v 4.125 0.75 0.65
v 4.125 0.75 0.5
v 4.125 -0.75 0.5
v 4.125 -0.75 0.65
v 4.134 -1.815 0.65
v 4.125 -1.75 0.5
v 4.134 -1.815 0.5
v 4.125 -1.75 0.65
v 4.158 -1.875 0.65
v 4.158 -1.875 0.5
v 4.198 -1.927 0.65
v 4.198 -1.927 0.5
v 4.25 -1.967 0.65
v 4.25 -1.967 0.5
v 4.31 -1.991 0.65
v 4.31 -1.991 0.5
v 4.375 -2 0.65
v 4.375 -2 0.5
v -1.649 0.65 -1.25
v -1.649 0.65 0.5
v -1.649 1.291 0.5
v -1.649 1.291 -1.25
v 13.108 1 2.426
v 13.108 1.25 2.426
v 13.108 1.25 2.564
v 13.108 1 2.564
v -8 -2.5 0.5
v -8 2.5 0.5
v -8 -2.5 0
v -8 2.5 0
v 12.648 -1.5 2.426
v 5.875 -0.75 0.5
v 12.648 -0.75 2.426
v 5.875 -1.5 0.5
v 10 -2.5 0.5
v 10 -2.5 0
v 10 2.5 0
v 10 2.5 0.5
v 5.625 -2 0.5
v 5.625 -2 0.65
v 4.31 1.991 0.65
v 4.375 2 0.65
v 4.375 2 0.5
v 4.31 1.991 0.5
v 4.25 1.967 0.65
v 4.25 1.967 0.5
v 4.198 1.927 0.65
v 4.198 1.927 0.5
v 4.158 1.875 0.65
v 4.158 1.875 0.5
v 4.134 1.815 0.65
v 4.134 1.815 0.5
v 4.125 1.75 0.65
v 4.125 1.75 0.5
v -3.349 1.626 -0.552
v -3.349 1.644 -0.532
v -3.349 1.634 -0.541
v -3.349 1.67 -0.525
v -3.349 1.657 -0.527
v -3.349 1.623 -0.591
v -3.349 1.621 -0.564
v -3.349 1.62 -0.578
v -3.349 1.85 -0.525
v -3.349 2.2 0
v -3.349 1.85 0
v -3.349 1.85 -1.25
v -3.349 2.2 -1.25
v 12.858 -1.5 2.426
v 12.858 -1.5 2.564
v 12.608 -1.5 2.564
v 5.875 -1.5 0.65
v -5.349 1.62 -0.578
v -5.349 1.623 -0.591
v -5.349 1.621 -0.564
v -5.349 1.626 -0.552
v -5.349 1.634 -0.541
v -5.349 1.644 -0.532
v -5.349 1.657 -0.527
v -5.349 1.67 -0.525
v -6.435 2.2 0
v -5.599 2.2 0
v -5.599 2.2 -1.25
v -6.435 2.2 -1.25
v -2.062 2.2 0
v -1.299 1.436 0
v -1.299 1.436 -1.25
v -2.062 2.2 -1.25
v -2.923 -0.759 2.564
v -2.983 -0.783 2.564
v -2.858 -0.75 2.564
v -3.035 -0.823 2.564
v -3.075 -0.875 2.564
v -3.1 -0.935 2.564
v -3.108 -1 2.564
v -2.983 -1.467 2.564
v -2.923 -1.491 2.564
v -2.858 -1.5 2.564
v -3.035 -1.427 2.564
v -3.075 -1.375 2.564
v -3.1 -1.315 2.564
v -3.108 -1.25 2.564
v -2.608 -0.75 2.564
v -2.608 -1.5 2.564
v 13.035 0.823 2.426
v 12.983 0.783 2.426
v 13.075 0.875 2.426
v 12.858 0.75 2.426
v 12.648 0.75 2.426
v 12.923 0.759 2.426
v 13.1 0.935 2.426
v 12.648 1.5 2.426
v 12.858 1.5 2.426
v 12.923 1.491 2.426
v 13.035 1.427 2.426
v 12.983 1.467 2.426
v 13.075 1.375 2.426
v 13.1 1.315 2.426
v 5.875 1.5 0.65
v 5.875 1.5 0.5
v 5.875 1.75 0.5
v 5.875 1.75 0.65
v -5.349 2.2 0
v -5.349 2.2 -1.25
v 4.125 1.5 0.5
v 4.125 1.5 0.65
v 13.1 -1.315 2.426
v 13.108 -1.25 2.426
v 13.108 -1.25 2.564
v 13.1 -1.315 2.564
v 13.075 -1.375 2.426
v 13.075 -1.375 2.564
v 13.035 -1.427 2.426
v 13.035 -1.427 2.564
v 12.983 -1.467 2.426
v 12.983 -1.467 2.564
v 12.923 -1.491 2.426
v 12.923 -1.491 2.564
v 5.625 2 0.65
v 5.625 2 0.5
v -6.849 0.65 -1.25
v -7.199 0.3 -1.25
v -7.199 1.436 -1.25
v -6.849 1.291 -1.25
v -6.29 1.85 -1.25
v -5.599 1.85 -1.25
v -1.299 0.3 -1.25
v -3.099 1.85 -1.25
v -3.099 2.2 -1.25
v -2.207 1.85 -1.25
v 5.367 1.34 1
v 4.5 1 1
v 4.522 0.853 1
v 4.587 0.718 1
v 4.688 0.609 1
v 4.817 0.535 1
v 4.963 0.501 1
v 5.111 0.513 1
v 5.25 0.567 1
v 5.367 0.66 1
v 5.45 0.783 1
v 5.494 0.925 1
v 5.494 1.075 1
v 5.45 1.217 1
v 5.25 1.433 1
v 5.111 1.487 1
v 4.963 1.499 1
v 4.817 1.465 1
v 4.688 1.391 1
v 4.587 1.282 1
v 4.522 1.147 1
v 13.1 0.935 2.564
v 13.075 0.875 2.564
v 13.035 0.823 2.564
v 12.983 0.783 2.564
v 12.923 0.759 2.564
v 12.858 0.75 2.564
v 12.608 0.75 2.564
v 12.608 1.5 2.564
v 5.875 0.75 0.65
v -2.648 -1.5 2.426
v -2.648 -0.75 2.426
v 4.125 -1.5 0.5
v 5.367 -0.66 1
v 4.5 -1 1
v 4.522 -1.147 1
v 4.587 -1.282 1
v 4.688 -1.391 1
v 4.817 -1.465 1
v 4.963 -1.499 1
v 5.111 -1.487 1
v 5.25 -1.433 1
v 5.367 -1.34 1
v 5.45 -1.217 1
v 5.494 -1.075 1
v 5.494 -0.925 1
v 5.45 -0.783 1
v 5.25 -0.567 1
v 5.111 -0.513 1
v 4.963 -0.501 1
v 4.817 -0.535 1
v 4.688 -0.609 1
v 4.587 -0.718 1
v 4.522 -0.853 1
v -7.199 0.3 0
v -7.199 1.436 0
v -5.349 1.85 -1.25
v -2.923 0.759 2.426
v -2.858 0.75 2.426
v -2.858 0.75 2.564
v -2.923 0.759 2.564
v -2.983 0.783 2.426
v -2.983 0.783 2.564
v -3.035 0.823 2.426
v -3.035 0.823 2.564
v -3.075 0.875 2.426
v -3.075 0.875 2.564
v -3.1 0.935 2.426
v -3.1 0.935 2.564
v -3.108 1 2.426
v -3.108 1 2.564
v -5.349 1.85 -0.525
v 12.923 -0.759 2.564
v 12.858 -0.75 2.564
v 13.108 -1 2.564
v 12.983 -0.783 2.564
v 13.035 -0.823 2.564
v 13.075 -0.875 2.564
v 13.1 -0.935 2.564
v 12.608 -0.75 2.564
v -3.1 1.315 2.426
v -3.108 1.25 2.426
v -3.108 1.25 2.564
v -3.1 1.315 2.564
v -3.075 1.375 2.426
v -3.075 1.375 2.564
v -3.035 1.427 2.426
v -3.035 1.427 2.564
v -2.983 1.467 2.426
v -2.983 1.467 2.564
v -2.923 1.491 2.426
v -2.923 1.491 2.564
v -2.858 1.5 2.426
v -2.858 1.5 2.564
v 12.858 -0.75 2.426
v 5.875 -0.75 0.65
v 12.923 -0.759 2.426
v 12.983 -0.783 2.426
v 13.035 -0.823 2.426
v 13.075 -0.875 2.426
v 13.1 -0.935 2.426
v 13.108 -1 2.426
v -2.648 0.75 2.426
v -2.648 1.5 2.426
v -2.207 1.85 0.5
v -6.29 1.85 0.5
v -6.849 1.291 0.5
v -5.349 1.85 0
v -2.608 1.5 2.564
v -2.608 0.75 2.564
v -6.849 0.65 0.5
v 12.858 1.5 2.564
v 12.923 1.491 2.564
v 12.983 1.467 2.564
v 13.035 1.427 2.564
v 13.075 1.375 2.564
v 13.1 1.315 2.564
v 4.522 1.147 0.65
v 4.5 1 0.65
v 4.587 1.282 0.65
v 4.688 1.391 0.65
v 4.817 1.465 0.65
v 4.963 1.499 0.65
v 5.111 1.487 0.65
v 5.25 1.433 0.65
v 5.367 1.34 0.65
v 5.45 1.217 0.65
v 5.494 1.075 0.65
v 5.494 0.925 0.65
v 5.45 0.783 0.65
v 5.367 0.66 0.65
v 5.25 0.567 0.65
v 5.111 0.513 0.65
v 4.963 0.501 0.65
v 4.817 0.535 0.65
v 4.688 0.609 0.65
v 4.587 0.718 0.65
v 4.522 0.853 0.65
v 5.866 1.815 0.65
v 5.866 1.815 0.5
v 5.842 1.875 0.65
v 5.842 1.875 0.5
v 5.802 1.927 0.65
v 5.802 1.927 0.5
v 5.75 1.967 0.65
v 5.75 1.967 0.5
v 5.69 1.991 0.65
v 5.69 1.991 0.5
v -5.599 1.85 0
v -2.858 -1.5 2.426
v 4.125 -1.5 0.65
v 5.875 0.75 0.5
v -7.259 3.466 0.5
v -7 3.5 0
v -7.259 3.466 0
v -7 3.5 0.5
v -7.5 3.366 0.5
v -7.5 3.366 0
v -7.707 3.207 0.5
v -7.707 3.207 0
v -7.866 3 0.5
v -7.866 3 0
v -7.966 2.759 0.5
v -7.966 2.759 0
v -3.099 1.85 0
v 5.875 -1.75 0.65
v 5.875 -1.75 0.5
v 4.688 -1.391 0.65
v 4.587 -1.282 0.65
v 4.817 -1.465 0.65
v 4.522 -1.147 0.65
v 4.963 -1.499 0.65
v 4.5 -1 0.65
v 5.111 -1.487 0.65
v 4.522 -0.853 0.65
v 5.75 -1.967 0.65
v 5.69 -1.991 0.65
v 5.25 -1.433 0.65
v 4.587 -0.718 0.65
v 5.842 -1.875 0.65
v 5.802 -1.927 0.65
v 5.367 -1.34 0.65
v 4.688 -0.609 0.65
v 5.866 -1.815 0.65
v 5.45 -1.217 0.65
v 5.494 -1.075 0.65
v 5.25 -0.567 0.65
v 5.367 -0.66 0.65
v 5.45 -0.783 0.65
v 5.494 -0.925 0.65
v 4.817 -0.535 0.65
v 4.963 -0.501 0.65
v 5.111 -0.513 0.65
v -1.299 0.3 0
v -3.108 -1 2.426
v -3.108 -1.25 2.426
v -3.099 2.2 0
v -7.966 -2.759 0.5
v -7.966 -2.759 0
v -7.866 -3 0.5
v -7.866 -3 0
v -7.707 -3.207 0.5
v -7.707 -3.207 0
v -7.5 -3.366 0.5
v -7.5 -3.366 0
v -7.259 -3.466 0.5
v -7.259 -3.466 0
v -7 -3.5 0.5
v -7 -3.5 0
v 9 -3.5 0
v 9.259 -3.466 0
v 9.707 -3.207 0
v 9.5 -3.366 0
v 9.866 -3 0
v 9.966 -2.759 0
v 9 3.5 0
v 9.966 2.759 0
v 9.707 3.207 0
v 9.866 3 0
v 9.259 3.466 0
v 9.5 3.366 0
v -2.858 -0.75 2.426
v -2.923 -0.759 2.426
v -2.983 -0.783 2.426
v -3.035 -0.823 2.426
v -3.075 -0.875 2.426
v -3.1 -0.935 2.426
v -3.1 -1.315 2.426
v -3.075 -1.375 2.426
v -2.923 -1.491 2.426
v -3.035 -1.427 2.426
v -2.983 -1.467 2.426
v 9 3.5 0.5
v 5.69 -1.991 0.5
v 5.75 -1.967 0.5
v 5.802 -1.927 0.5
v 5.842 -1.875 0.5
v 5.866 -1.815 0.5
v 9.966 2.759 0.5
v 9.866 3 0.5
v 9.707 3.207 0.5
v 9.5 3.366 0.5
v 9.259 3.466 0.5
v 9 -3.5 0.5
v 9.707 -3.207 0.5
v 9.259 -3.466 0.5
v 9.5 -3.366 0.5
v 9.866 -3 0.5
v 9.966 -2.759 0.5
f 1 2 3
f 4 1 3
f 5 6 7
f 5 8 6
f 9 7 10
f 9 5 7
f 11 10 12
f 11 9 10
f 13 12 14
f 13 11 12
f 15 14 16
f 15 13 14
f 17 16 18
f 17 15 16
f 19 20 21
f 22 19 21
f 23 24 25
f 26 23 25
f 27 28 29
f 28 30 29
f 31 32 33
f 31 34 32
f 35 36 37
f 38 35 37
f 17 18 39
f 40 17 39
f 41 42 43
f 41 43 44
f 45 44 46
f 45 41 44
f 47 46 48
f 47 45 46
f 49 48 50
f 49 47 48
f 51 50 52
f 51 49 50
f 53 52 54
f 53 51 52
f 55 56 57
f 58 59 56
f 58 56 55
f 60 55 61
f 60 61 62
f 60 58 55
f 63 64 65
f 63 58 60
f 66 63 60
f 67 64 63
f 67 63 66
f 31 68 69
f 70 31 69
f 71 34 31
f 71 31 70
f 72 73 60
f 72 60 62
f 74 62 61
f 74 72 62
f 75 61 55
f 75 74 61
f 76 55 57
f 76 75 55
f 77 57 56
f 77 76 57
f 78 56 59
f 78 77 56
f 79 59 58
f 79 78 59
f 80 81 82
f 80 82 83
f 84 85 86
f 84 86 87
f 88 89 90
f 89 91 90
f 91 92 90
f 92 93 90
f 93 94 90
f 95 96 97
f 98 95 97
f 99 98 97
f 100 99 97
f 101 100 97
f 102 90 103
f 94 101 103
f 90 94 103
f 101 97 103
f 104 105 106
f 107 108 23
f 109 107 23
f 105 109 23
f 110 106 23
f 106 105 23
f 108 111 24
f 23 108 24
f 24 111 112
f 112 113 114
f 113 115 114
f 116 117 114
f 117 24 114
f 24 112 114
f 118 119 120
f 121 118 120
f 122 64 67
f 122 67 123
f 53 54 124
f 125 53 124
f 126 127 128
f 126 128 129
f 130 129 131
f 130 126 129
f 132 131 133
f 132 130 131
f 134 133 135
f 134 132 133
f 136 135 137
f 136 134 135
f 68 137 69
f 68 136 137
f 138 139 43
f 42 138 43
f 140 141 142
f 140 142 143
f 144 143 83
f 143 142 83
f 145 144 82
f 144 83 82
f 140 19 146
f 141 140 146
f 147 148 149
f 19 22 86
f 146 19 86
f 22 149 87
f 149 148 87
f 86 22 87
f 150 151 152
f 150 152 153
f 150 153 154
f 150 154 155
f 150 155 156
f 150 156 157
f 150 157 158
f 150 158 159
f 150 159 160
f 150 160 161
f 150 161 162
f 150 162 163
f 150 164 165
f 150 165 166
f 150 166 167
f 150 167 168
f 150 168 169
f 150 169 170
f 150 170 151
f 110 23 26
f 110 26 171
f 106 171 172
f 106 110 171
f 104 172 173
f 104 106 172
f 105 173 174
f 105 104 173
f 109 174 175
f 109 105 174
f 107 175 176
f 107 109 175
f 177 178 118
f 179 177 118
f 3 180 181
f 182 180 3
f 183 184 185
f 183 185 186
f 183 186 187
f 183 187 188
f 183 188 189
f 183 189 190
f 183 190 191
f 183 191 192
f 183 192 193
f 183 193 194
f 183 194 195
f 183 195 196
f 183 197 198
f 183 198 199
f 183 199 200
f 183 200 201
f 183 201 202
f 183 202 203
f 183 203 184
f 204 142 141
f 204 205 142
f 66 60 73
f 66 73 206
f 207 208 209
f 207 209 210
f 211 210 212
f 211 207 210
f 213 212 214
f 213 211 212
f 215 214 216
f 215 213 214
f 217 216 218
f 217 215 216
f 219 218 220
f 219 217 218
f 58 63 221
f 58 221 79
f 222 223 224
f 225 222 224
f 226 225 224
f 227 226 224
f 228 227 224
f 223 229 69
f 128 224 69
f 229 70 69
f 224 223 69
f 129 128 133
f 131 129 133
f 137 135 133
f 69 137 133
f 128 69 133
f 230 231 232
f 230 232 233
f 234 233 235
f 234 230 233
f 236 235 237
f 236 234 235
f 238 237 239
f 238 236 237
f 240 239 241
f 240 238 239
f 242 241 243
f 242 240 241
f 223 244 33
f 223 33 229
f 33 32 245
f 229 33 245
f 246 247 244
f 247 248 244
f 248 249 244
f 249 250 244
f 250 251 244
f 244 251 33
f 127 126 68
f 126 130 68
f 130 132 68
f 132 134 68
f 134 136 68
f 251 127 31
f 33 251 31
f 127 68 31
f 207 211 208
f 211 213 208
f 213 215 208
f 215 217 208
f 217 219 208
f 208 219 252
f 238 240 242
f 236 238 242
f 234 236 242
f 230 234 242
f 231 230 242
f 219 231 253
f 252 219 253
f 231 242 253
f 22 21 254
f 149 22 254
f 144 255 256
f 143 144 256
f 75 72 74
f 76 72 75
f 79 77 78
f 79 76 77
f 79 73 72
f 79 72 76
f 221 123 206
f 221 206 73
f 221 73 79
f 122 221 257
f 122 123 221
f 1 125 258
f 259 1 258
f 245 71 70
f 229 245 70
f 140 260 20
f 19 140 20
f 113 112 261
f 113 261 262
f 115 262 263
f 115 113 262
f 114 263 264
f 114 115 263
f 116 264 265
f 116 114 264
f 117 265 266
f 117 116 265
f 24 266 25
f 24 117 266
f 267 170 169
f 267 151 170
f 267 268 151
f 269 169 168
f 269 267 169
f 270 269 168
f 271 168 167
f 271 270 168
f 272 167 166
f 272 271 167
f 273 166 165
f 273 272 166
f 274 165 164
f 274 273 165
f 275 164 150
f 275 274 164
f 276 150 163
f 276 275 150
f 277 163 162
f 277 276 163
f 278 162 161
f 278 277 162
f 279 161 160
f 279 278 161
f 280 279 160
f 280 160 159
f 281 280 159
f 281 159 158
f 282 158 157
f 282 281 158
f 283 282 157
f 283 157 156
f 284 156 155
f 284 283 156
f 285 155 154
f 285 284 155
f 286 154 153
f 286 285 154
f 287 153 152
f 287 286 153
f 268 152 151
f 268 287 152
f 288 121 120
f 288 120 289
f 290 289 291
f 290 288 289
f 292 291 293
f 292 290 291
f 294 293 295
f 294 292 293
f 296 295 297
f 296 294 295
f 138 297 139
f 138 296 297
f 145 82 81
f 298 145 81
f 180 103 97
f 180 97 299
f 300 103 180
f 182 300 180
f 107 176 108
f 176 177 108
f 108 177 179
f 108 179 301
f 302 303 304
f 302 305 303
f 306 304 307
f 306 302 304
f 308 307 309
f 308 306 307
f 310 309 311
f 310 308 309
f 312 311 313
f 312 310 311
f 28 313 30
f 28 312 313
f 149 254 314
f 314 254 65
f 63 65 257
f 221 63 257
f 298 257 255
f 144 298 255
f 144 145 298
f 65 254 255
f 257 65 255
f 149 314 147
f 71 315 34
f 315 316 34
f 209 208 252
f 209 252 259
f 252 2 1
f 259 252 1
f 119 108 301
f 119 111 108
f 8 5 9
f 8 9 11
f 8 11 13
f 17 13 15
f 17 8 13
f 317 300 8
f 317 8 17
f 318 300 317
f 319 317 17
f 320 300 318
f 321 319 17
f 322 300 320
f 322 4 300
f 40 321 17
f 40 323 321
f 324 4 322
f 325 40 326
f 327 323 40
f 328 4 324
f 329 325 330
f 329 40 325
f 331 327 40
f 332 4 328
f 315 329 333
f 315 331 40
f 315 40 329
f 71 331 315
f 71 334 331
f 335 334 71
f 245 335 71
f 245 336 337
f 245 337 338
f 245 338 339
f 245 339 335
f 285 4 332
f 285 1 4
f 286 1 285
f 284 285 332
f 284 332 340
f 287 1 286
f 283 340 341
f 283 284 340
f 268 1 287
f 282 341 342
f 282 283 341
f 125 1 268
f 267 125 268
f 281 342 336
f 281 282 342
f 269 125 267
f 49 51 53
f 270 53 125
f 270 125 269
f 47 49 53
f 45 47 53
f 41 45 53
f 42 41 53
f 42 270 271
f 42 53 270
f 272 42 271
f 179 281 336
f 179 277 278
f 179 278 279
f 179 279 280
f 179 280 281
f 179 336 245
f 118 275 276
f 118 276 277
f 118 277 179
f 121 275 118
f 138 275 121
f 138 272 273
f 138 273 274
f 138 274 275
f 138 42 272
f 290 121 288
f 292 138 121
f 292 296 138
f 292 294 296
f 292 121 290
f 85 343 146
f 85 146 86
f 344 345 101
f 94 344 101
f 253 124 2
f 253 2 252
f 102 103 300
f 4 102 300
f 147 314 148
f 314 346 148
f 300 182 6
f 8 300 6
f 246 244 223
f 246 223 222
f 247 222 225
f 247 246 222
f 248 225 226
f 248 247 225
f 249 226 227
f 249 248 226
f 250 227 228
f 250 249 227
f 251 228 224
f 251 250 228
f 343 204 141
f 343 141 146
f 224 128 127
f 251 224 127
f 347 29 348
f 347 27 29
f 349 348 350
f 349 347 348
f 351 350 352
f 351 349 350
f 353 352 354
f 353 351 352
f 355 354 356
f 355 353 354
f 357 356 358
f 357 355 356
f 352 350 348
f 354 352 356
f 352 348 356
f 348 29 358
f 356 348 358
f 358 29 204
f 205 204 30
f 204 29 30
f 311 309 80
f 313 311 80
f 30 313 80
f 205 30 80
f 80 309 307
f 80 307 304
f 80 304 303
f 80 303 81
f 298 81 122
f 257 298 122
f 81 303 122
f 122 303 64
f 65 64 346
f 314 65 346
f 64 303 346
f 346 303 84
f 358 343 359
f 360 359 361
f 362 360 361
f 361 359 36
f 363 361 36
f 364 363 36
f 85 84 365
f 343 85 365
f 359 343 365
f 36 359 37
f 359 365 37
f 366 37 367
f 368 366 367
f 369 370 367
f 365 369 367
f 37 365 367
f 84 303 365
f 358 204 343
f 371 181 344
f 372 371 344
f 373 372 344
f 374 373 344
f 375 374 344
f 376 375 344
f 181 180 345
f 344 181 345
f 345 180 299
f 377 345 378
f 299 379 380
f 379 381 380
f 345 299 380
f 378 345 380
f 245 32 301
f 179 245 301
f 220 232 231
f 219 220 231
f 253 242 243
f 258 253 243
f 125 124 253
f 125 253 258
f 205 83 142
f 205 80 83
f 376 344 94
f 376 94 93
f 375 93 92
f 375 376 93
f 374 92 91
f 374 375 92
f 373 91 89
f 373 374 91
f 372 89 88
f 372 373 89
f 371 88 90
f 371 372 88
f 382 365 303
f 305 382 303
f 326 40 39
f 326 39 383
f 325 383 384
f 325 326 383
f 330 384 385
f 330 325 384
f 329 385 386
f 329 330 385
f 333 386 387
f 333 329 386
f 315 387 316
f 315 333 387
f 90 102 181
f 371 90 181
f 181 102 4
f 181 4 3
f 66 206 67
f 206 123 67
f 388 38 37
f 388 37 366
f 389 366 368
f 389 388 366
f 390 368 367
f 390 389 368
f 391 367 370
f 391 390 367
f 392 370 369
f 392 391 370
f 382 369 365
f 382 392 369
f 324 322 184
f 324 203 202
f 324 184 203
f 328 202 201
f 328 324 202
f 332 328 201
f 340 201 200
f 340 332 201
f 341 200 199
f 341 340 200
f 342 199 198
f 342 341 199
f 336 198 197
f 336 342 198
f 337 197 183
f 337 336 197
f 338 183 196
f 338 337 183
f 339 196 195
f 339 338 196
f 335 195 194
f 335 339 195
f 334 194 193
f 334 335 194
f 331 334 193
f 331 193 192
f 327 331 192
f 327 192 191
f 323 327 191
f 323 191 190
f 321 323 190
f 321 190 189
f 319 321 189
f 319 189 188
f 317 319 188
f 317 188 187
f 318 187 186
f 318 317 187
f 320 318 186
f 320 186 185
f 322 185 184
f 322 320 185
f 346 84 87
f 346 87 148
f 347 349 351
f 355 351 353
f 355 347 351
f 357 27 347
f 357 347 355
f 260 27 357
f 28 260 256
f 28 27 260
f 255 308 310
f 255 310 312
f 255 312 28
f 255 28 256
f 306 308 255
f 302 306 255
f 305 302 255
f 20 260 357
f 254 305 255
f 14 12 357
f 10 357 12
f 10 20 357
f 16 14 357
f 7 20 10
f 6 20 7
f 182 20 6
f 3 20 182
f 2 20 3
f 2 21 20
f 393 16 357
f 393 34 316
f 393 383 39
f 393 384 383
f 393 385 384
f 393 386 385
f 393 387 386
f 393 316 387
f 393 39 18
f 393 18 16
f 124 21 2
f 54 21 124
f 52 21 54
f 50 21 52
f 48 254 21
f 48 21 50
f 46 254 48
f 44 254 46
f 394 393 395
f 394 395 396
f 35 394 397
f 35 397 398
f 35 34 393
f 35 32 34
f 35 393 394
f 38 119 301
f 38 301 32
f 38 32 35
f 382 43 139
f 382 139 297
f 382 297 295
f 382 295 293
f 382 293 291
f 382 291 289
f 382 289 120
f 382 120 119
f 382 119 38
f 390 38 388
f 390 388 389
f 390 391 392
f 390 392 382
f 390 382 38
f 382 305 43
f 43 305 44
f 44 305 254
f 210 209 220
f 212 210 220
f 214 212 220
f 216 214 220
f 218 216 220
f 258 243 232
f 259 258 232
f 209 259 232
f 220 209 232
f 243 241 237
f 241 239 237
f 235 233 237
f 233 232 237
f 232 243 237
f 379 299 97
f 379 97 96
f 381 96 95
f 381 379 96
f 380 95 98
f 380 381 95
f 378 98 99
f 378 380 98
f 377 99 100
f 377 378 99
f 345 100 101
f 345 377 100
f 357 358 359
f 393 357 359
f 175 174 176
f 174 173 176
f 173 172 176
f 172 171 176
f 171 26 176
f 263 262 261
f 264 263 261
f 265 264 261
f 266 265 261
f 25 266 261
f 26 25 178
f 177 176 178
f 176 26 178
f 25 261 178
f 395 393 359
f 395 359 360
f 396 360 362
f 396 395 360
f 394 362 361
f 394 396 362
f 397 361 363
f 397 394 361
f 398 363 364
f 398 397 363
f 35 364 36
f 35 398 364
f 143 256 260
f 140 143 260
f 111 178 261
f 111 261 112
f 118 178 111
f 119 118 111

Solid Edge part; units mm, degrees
sketch "Sketch1" plane through (0, 0, 0) normal (0, 0, 1) x (1, 0, 0)
  line L0 (-8, -3.5) -> (10, -3.5)
  line L1 (10, -3.5) -> (10, 3.5)
  line L2 (10, 3.5) -> (-8, 3.5)
  line L3 (-8, 3.5) -> (-8, -3.5)
  dimension "D1" = 7
  dimension "D2" = 18
  dimension "D3" = 10
extrude "Protrusion1" add sketch "Sketch1" along normal blind 0.5
sketch "Sketch2" plane through (2, 0, 0.5) normal (0, 0, 1) x (-1, 0, 0)
  line L0 (8.8487, -0.65) -> (3.6487, -0.65)
  line L1 (3.6487, -0.65) -> (3.6487, -1.2914)
  line L2 (3.6487, -1.2914) -> (4.2073, -1.85)
  line L3 (4.2073, -1.85) -> (8.2901, -1.85)
  line L4 (8.2901, -1.85) -> (8.8487, -1.2914)
  line L5 (8.8487, -1.2914) -> (8.8487, -0.65)
extrude "Cutout1" cut sketch "Sketch2" against normal up to next
sketch "Sketch3" plane through (2, 0, 0) normal (0, 0, -1) x (1, 0, 0)
  line L0 (-8.2901, -1.85) -> (-8.8487, -1.2914)
  line L1 (-8.8487, -1.2914) -> (-8.8487, -0.65)
  line L2 (-8.8487, -0.65) -> (-3.6487, -0.65)
  line L3 (-3.6487, -0.65) -> (-3.6487, -1.2914)
  line L4 (-3.6487, -1.2914) -> (-4.2073, -1.85)
  line L5 (-4.2073, -1.85) -> (-8.2901, -1.85)
  line L6 (-9.1987, -0.3) -> (-3.2987, -0.3)
  line L7 (-3.2987, -0.3) -> (-3.2987, -1.4364)
  line L8 (-3.2987, -1.4364) -> (-4.0623, -2.2)
  line L9 (-4.0623, -2.2) -> (-8.4351, -2.2)
  line L10 (-8.4351, -2.2) -> (-9.1987, -1.4364)
  line L11 (-9.1987, -1.4364) -> (-9.1987, -0.3)
extrude "ExtrudedProtrusion_2" add sketch "Sketch3" along normal blind 1.25
sketch "Sketch4" plane through (-3.0487, 2.2, -0.625) normal (0, 1, 0) x (1, 0, 0)
  line L0 (-0.05, -0.625) -> (-0.05, 1.2393)
  line L1 (-0.3, 1.2393) -> (-0.05, 1.2393)
  line L2 (-0.3, -0.625) -> (-0.3, 1.2393)
  line L3 (-0.05, -0.625) -> (-0.3, -0.625)
  line L4 (-2.55, 1.2393) -> (-2.55, -0.625)
  line L5 (-2.3, -0.625) -> (-2.55, -0.625)
  line L6 (-2.3, 1.2393) -> (-2.3, -0.625)
  line L7 (-2.55, 1.2393) -> (-2.3, 1.2393)
extrude "Cutout2" cut sketch "Sketch4" against normal up to next
sketch "Sketch5" plane through (-3.3487, 2.025, -0.625) normal (1, 0, 0) x (0, -1, 0)
  line L0 (0.175, -0.1) -> (0.425, -0.1)
  line L1 (0.425, -0.1) -> (0.175, 0.625)
  dimension "D1" = 0.25
  dimension "D2" = 0.525
extrude "Protrusion2" add sketch "Sketch5" against normal up to vertex (2 mm away) material side at (-3.3487, 1.725, -0.575)
fillet "Round_1" radius 0.05 1 edges at (-4.3487, 1.6, -0.525)
fillet "Round_2" radius 1 4 edges at (10, 3.5, 0.25) (10, -3.5, 0.25) (-8, 3.5, 0.25) (-8, -3.5, 0.25)
sketch "Sketch6" plane through (2, 0, 0.5) normal (0, 0, 1) x (-1, 0, 0)
  circle A0 centre (-3, -1) radius 0.5
  circle A1 centre (-3, 1) radius 0.5
  dimension "D1" = 2
  dimension "D2" = 2.5
  dimension "D3" = 2.5
  dimension "D4" = 5
extrude "ExtrudedProtrusion_4" add sketch "Sketch6" along normal blind 0.5
sketch "Sketch7" plane through (2, 0, 0.5) normal (0, 0, 1) x (-1, 0, 0)
  line L0 (-3.875, -2) -> (-2.125, -2)
  line L1 (-2.125, -2) -> (-2.125, 2)
  line L2 (-2.125, 2) -> (-3.875, 2)
  line L3 (-3.875, 2) -> (-3.875, -2)
  dimension "D1" = 1.75
  dimension "D2" = 4
extrude "ExtrudedProtrusion_5" add sketch "Sketch7" along normal blind 0.15
fillet "Round_3" radius 0.25 4 edges at (5.875, 2, 0.575) (4.125, 2, 0.575) (4.125, -2, 0.575) (5.875, -2, 0.575)
sketch "Sketch8" plane through (6, 1.5, 0.575) normal (0, 1, 0) x (-1, 0, 0)
  line L0 (1.875, 0.075) -> (8.6082, 1.9893)
  line L1 (8.6082, 1.9893) -> (9.1082, 1.9893)
  line L2 (9.1082, 1.9893) -> (9.1082, 1.8505)
  line L3 (9.1082, 1.8505) -> (8.6476, 1.8505)
  line L4 (1.875, -0.075) -> (8.6476, 1.8505)
  dimension "D1" = 7
  dimension "D2" = 0.1388
  dimension "D3" = 0.5
extrude "ExtrudedProtrusion_6" add sketch "Sketch8" against normal blind 0.75 material side at (0.7447, 1.5, 1.5591)
fillet "Round_4" radius 0.25 2 edges at (-3.1082, 1.5, 2.4949) (-3.1082, 0.75, 2.4949)
mirror "Mirror1" about plane through (6, 0, 0.575) normal (0, 1, 0) of "ExtrudedProtrusion_6"
fillet "Round1" radius 0.25 2 edges at (-3.1082, -1.5, 2.4949) (-3.1082, -0.75, 2.4949)
mirror "Mirror2" about plane through (5, 0, 0.575) normal (1, 0, 0) of "Mirror1", "ExtrudedProtrusion_6"
fillet "Round2" radius 0.25 2 edges at (13.1082, 1.5, 2.4949) (13.1082, 0.75, 2.4949)
fillet "Round3" radius 0.25 2 edges at (13.1082, -1.5, 2.4949) (13.1082, -0.75, 2.4949)
properties material "Polypropylene, general purpose"
